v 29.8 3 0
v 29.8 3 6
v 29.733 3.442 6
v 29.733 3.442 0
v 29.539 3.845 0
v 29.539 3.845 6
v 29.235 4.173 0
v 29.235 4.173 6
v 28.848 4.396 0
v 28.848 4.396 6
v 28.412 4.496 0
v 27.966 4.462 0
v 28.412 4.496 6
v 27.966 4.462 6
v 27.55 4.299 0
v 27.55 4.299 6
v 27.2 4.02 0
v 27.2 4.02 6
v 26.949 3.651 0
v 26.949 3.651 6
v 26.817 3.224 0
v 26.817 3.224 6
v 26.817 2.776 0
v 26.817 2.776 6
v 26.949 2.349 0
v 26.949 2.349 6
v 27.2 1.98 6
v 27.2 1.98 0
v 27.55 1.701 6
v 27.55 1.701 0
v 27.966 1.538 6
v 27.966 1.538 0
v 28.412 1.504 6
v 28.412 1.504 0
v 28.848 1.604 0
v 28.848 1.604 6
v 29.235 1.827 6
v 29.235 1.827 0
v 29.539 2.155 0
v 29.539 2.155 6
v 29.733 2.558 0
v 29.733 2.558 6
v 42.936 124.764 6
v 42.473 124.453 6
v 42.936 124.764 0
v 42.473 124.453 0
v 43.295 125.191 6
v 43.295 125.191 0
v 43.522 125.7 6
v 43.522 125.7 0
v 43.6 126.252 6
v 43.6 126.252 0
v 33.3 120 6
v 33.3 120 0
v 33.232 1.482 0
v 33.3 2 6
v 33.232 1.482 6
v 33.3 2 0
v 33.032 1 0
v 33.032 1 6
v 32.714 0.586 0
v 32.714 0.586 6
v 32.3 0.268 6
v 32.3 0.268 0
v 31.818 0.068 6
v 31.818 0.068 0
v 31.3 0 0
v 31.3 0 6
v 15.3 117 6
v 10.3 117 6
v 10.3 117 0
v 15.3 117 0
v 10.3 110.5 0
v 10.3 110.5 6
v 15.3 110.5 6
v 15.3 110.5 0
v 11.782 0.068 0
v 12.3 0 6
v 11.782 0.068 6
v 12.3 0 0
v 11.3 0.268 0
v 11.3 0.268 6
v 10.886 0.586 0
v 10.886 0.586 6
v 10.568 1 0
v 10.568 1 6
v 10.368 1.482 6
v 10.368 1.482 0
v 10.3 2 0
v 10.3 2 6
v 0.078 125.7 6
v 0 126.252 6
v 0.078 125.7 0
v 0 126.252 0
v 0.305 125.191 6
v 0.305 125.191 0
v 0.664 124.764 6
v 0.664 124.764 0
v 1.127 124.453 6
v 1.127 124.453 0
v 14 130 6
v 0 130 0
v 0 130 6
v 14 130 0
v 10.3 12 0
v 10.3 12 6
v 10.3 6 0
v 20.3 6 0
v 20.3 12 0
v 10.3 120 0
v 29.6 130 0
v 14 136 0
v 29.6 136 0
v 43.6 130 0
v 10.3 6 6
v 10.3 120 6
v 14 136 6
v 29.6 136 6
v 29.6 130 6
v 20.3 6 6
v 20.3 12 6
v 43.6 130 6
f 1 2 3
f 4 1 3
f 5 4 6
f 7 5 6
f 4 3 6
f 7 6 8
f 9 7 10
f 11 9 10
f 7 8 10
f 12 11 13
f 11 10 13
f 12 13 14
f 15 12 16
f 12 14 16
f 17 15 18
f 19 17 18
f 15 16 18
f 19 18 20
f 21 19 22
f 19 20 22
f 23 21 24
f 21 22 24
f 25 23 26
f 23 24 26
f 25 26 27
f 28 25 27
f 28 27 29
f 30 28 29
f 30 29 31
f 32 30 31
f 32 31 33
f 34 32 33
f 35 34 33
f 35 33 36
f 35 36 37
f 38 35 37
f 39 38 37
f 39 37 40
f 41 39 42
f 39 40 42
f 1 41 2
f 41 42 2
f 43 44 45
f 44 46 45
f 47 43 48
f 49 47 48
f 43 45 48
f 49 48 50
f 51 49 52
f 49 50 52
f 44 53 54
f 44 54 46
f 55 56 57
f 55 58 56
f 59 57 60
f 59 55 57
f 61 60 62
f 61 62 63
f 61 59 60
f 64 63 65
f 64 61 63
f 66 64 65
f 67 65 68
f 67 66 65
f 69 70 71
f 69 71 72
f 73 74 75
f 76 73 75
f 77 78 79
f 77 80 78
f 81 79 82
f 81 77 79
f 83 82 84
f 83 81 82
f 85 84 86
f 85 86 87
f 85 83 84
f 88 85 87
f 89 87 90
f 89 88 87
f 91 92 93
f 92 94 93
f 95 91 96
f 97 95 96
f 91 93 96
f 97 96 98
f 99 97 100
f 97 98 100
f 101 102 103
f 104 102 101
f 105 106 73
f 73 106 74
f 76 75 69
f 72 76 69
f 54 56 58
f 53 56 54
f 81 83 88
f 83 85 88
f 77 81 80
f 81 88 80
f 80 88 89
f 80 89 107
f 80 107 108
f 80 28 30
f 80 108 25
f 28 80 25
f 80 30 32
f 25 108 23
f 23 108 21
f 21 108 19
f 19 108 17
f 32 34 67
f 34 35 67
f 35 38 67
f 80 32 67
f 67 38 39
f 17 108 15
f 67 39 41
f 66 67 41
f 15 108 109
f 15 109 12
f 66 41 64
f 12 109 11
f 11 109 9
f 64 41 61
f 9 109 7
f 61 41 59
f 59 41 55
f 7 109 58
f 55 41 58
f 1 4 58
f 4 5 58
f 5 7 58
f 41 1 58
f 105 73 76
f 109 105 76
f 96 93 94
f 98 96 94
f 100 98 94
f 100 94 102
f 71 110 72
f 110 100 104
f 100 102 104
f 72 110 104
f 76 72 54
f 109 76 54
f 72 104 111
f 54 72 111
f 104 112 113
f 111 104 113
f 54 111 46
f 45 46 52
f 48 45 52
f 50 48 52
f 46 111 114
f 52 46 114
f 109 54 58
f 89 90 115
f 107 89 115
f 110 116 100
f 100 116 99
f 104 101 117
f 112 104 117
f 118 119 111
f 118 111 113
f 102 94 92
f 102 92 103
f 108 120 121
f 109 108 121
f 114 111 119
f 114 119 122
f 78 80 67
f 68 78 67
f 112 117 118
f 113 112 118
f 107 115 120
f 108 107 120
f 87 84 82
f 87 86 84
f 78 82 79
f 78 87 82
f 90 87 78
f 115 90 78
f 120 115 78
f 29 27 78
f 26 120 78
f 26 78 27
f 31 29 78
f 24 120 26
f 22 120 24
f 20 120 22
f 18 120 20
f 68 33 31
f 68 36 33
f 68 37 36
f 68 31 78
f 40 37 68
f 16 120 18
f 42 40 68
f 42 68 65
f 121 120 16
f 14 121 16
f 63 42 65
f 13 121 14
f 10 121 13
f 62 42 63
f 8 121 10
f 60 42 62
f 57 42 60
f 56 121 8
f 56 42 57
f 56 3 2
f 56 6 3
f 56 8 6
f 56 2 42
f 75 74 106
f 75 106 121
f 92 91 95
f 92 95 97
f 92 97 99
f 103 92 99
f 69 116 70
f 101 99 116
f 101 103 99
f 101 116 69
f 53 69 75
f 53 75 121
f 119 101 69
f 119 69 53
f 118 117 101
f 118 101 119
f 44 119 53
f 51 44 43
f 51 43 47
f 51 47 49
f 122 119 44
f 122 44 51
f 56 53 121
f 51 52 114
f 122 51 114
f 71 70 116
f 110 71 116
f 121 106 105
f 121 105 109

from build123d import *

# Parameters (mm, degrees)
ESQUISSE1_W             = 43.6
ESQUISSE1_H             = 130
BOSS_EXTRU_1_DEPTH      = 6
ENL_V_MAT_EXTRU_1_DEPTH = 6
ESQUISSE4_W             = 15.6
ESQUISSE4_H             = 6
BOSS_EXTRU_2_DEPTH      = 6
ESQUISSE6_W             = 10
ESQUISSE6_H             = 6
ESQUISSE6_W_2           = 5
ESQUISSE6_H_2           = 6.5
ENL_V_MAT_EXTRU_3_DEPTH = 6
CONG_8_R                = 2
CONG_9_R                = 2
ESQUISSE7_R             = 1.5
ENL_V_MAT_EXTRU_4_DEPTH = 6


with BuildPart() as part:
    # Esquisse1 → Boss.-Extru.1 (new body)
    with BuildSketch(Plane.XY):
        with Locations((21.8, 65)):
            Rectangle(ESQUISSE1_W, ESQUISSE1_H)
    extrude(amount=BOSS_EXTRU_1_DEPTH)

    # Esquisse2 → Enlèv. mat.-Extru.1 (cut)
    with BuildSketch(Plane.XY.offset(6)):
        Polygon((43.6, 0), (33.3, 0), (33.3, 120), (43.6, 125), align=None)
        Polygon((10.3, 120), (0, 125), (0, 0), (10.3, 0), align=None)
    extrude(amount=-ENL_V_MAT_EXTRU_1_DEPTH, mode=Mode.SUBTRACT)

    # Esquisse4 → Boss.-Extru.2 (add)
    with BuildSketch(Plane.XY.offset(6)):
        with Locations((21.8, 133)):
            Rectangle(ESQUISSE4_W, ESQUISSE4_H)
    extrude(amount=-BOSS_EXTRU_2_DEPTH)

    # Esquisse6 → Enlèv. mat.-Extru.3 (cut)
    with BuildSketch(Plane.XY.offset(6)):
        with Locations((15.3, 9)):
            Rectangle(ESQUISSE6_W, ESQUISSE6_H)
        with Locations((12.8, 113.75)):
            Rectangle(ESQUISSE6_W_2, ESQUISSE6_H_2)
    extrude(amount=-ENL_V_MAT_EXTRU_3_DEPTH, mode=Mode.SUBTRACT)

    # Congé8
    cong_8_edges = [part.edges().sort_by_distance(p)[0] for p in [
        (33.3, 0, 3),
        (10.3, 0, 3),
    ]]
    fillet(cong_8_edges, radius=CONG_8_R)

    # Congé9
    cong_9_edges = [part.edges().sort_by_distance(p)[0] for p in [
        (43.6, 125, 3),
        (0, 125, 3),
    ]]
    fillet(cong_9_edges, radius=CONG_9_R)

    # Esquisse7 → Enlèv. mat.-Extru.4 (cut)
    with BuildSketch(Plane.XY.offset(6)):
        with Locations((28.3, 3)):
            Circle(ESQUISSE7_R)
    extrude(amount=-ENL_V_MAT_EXTRU_4_DEPTH, mode=Mode.SUBTRACT)


solid = part.part
